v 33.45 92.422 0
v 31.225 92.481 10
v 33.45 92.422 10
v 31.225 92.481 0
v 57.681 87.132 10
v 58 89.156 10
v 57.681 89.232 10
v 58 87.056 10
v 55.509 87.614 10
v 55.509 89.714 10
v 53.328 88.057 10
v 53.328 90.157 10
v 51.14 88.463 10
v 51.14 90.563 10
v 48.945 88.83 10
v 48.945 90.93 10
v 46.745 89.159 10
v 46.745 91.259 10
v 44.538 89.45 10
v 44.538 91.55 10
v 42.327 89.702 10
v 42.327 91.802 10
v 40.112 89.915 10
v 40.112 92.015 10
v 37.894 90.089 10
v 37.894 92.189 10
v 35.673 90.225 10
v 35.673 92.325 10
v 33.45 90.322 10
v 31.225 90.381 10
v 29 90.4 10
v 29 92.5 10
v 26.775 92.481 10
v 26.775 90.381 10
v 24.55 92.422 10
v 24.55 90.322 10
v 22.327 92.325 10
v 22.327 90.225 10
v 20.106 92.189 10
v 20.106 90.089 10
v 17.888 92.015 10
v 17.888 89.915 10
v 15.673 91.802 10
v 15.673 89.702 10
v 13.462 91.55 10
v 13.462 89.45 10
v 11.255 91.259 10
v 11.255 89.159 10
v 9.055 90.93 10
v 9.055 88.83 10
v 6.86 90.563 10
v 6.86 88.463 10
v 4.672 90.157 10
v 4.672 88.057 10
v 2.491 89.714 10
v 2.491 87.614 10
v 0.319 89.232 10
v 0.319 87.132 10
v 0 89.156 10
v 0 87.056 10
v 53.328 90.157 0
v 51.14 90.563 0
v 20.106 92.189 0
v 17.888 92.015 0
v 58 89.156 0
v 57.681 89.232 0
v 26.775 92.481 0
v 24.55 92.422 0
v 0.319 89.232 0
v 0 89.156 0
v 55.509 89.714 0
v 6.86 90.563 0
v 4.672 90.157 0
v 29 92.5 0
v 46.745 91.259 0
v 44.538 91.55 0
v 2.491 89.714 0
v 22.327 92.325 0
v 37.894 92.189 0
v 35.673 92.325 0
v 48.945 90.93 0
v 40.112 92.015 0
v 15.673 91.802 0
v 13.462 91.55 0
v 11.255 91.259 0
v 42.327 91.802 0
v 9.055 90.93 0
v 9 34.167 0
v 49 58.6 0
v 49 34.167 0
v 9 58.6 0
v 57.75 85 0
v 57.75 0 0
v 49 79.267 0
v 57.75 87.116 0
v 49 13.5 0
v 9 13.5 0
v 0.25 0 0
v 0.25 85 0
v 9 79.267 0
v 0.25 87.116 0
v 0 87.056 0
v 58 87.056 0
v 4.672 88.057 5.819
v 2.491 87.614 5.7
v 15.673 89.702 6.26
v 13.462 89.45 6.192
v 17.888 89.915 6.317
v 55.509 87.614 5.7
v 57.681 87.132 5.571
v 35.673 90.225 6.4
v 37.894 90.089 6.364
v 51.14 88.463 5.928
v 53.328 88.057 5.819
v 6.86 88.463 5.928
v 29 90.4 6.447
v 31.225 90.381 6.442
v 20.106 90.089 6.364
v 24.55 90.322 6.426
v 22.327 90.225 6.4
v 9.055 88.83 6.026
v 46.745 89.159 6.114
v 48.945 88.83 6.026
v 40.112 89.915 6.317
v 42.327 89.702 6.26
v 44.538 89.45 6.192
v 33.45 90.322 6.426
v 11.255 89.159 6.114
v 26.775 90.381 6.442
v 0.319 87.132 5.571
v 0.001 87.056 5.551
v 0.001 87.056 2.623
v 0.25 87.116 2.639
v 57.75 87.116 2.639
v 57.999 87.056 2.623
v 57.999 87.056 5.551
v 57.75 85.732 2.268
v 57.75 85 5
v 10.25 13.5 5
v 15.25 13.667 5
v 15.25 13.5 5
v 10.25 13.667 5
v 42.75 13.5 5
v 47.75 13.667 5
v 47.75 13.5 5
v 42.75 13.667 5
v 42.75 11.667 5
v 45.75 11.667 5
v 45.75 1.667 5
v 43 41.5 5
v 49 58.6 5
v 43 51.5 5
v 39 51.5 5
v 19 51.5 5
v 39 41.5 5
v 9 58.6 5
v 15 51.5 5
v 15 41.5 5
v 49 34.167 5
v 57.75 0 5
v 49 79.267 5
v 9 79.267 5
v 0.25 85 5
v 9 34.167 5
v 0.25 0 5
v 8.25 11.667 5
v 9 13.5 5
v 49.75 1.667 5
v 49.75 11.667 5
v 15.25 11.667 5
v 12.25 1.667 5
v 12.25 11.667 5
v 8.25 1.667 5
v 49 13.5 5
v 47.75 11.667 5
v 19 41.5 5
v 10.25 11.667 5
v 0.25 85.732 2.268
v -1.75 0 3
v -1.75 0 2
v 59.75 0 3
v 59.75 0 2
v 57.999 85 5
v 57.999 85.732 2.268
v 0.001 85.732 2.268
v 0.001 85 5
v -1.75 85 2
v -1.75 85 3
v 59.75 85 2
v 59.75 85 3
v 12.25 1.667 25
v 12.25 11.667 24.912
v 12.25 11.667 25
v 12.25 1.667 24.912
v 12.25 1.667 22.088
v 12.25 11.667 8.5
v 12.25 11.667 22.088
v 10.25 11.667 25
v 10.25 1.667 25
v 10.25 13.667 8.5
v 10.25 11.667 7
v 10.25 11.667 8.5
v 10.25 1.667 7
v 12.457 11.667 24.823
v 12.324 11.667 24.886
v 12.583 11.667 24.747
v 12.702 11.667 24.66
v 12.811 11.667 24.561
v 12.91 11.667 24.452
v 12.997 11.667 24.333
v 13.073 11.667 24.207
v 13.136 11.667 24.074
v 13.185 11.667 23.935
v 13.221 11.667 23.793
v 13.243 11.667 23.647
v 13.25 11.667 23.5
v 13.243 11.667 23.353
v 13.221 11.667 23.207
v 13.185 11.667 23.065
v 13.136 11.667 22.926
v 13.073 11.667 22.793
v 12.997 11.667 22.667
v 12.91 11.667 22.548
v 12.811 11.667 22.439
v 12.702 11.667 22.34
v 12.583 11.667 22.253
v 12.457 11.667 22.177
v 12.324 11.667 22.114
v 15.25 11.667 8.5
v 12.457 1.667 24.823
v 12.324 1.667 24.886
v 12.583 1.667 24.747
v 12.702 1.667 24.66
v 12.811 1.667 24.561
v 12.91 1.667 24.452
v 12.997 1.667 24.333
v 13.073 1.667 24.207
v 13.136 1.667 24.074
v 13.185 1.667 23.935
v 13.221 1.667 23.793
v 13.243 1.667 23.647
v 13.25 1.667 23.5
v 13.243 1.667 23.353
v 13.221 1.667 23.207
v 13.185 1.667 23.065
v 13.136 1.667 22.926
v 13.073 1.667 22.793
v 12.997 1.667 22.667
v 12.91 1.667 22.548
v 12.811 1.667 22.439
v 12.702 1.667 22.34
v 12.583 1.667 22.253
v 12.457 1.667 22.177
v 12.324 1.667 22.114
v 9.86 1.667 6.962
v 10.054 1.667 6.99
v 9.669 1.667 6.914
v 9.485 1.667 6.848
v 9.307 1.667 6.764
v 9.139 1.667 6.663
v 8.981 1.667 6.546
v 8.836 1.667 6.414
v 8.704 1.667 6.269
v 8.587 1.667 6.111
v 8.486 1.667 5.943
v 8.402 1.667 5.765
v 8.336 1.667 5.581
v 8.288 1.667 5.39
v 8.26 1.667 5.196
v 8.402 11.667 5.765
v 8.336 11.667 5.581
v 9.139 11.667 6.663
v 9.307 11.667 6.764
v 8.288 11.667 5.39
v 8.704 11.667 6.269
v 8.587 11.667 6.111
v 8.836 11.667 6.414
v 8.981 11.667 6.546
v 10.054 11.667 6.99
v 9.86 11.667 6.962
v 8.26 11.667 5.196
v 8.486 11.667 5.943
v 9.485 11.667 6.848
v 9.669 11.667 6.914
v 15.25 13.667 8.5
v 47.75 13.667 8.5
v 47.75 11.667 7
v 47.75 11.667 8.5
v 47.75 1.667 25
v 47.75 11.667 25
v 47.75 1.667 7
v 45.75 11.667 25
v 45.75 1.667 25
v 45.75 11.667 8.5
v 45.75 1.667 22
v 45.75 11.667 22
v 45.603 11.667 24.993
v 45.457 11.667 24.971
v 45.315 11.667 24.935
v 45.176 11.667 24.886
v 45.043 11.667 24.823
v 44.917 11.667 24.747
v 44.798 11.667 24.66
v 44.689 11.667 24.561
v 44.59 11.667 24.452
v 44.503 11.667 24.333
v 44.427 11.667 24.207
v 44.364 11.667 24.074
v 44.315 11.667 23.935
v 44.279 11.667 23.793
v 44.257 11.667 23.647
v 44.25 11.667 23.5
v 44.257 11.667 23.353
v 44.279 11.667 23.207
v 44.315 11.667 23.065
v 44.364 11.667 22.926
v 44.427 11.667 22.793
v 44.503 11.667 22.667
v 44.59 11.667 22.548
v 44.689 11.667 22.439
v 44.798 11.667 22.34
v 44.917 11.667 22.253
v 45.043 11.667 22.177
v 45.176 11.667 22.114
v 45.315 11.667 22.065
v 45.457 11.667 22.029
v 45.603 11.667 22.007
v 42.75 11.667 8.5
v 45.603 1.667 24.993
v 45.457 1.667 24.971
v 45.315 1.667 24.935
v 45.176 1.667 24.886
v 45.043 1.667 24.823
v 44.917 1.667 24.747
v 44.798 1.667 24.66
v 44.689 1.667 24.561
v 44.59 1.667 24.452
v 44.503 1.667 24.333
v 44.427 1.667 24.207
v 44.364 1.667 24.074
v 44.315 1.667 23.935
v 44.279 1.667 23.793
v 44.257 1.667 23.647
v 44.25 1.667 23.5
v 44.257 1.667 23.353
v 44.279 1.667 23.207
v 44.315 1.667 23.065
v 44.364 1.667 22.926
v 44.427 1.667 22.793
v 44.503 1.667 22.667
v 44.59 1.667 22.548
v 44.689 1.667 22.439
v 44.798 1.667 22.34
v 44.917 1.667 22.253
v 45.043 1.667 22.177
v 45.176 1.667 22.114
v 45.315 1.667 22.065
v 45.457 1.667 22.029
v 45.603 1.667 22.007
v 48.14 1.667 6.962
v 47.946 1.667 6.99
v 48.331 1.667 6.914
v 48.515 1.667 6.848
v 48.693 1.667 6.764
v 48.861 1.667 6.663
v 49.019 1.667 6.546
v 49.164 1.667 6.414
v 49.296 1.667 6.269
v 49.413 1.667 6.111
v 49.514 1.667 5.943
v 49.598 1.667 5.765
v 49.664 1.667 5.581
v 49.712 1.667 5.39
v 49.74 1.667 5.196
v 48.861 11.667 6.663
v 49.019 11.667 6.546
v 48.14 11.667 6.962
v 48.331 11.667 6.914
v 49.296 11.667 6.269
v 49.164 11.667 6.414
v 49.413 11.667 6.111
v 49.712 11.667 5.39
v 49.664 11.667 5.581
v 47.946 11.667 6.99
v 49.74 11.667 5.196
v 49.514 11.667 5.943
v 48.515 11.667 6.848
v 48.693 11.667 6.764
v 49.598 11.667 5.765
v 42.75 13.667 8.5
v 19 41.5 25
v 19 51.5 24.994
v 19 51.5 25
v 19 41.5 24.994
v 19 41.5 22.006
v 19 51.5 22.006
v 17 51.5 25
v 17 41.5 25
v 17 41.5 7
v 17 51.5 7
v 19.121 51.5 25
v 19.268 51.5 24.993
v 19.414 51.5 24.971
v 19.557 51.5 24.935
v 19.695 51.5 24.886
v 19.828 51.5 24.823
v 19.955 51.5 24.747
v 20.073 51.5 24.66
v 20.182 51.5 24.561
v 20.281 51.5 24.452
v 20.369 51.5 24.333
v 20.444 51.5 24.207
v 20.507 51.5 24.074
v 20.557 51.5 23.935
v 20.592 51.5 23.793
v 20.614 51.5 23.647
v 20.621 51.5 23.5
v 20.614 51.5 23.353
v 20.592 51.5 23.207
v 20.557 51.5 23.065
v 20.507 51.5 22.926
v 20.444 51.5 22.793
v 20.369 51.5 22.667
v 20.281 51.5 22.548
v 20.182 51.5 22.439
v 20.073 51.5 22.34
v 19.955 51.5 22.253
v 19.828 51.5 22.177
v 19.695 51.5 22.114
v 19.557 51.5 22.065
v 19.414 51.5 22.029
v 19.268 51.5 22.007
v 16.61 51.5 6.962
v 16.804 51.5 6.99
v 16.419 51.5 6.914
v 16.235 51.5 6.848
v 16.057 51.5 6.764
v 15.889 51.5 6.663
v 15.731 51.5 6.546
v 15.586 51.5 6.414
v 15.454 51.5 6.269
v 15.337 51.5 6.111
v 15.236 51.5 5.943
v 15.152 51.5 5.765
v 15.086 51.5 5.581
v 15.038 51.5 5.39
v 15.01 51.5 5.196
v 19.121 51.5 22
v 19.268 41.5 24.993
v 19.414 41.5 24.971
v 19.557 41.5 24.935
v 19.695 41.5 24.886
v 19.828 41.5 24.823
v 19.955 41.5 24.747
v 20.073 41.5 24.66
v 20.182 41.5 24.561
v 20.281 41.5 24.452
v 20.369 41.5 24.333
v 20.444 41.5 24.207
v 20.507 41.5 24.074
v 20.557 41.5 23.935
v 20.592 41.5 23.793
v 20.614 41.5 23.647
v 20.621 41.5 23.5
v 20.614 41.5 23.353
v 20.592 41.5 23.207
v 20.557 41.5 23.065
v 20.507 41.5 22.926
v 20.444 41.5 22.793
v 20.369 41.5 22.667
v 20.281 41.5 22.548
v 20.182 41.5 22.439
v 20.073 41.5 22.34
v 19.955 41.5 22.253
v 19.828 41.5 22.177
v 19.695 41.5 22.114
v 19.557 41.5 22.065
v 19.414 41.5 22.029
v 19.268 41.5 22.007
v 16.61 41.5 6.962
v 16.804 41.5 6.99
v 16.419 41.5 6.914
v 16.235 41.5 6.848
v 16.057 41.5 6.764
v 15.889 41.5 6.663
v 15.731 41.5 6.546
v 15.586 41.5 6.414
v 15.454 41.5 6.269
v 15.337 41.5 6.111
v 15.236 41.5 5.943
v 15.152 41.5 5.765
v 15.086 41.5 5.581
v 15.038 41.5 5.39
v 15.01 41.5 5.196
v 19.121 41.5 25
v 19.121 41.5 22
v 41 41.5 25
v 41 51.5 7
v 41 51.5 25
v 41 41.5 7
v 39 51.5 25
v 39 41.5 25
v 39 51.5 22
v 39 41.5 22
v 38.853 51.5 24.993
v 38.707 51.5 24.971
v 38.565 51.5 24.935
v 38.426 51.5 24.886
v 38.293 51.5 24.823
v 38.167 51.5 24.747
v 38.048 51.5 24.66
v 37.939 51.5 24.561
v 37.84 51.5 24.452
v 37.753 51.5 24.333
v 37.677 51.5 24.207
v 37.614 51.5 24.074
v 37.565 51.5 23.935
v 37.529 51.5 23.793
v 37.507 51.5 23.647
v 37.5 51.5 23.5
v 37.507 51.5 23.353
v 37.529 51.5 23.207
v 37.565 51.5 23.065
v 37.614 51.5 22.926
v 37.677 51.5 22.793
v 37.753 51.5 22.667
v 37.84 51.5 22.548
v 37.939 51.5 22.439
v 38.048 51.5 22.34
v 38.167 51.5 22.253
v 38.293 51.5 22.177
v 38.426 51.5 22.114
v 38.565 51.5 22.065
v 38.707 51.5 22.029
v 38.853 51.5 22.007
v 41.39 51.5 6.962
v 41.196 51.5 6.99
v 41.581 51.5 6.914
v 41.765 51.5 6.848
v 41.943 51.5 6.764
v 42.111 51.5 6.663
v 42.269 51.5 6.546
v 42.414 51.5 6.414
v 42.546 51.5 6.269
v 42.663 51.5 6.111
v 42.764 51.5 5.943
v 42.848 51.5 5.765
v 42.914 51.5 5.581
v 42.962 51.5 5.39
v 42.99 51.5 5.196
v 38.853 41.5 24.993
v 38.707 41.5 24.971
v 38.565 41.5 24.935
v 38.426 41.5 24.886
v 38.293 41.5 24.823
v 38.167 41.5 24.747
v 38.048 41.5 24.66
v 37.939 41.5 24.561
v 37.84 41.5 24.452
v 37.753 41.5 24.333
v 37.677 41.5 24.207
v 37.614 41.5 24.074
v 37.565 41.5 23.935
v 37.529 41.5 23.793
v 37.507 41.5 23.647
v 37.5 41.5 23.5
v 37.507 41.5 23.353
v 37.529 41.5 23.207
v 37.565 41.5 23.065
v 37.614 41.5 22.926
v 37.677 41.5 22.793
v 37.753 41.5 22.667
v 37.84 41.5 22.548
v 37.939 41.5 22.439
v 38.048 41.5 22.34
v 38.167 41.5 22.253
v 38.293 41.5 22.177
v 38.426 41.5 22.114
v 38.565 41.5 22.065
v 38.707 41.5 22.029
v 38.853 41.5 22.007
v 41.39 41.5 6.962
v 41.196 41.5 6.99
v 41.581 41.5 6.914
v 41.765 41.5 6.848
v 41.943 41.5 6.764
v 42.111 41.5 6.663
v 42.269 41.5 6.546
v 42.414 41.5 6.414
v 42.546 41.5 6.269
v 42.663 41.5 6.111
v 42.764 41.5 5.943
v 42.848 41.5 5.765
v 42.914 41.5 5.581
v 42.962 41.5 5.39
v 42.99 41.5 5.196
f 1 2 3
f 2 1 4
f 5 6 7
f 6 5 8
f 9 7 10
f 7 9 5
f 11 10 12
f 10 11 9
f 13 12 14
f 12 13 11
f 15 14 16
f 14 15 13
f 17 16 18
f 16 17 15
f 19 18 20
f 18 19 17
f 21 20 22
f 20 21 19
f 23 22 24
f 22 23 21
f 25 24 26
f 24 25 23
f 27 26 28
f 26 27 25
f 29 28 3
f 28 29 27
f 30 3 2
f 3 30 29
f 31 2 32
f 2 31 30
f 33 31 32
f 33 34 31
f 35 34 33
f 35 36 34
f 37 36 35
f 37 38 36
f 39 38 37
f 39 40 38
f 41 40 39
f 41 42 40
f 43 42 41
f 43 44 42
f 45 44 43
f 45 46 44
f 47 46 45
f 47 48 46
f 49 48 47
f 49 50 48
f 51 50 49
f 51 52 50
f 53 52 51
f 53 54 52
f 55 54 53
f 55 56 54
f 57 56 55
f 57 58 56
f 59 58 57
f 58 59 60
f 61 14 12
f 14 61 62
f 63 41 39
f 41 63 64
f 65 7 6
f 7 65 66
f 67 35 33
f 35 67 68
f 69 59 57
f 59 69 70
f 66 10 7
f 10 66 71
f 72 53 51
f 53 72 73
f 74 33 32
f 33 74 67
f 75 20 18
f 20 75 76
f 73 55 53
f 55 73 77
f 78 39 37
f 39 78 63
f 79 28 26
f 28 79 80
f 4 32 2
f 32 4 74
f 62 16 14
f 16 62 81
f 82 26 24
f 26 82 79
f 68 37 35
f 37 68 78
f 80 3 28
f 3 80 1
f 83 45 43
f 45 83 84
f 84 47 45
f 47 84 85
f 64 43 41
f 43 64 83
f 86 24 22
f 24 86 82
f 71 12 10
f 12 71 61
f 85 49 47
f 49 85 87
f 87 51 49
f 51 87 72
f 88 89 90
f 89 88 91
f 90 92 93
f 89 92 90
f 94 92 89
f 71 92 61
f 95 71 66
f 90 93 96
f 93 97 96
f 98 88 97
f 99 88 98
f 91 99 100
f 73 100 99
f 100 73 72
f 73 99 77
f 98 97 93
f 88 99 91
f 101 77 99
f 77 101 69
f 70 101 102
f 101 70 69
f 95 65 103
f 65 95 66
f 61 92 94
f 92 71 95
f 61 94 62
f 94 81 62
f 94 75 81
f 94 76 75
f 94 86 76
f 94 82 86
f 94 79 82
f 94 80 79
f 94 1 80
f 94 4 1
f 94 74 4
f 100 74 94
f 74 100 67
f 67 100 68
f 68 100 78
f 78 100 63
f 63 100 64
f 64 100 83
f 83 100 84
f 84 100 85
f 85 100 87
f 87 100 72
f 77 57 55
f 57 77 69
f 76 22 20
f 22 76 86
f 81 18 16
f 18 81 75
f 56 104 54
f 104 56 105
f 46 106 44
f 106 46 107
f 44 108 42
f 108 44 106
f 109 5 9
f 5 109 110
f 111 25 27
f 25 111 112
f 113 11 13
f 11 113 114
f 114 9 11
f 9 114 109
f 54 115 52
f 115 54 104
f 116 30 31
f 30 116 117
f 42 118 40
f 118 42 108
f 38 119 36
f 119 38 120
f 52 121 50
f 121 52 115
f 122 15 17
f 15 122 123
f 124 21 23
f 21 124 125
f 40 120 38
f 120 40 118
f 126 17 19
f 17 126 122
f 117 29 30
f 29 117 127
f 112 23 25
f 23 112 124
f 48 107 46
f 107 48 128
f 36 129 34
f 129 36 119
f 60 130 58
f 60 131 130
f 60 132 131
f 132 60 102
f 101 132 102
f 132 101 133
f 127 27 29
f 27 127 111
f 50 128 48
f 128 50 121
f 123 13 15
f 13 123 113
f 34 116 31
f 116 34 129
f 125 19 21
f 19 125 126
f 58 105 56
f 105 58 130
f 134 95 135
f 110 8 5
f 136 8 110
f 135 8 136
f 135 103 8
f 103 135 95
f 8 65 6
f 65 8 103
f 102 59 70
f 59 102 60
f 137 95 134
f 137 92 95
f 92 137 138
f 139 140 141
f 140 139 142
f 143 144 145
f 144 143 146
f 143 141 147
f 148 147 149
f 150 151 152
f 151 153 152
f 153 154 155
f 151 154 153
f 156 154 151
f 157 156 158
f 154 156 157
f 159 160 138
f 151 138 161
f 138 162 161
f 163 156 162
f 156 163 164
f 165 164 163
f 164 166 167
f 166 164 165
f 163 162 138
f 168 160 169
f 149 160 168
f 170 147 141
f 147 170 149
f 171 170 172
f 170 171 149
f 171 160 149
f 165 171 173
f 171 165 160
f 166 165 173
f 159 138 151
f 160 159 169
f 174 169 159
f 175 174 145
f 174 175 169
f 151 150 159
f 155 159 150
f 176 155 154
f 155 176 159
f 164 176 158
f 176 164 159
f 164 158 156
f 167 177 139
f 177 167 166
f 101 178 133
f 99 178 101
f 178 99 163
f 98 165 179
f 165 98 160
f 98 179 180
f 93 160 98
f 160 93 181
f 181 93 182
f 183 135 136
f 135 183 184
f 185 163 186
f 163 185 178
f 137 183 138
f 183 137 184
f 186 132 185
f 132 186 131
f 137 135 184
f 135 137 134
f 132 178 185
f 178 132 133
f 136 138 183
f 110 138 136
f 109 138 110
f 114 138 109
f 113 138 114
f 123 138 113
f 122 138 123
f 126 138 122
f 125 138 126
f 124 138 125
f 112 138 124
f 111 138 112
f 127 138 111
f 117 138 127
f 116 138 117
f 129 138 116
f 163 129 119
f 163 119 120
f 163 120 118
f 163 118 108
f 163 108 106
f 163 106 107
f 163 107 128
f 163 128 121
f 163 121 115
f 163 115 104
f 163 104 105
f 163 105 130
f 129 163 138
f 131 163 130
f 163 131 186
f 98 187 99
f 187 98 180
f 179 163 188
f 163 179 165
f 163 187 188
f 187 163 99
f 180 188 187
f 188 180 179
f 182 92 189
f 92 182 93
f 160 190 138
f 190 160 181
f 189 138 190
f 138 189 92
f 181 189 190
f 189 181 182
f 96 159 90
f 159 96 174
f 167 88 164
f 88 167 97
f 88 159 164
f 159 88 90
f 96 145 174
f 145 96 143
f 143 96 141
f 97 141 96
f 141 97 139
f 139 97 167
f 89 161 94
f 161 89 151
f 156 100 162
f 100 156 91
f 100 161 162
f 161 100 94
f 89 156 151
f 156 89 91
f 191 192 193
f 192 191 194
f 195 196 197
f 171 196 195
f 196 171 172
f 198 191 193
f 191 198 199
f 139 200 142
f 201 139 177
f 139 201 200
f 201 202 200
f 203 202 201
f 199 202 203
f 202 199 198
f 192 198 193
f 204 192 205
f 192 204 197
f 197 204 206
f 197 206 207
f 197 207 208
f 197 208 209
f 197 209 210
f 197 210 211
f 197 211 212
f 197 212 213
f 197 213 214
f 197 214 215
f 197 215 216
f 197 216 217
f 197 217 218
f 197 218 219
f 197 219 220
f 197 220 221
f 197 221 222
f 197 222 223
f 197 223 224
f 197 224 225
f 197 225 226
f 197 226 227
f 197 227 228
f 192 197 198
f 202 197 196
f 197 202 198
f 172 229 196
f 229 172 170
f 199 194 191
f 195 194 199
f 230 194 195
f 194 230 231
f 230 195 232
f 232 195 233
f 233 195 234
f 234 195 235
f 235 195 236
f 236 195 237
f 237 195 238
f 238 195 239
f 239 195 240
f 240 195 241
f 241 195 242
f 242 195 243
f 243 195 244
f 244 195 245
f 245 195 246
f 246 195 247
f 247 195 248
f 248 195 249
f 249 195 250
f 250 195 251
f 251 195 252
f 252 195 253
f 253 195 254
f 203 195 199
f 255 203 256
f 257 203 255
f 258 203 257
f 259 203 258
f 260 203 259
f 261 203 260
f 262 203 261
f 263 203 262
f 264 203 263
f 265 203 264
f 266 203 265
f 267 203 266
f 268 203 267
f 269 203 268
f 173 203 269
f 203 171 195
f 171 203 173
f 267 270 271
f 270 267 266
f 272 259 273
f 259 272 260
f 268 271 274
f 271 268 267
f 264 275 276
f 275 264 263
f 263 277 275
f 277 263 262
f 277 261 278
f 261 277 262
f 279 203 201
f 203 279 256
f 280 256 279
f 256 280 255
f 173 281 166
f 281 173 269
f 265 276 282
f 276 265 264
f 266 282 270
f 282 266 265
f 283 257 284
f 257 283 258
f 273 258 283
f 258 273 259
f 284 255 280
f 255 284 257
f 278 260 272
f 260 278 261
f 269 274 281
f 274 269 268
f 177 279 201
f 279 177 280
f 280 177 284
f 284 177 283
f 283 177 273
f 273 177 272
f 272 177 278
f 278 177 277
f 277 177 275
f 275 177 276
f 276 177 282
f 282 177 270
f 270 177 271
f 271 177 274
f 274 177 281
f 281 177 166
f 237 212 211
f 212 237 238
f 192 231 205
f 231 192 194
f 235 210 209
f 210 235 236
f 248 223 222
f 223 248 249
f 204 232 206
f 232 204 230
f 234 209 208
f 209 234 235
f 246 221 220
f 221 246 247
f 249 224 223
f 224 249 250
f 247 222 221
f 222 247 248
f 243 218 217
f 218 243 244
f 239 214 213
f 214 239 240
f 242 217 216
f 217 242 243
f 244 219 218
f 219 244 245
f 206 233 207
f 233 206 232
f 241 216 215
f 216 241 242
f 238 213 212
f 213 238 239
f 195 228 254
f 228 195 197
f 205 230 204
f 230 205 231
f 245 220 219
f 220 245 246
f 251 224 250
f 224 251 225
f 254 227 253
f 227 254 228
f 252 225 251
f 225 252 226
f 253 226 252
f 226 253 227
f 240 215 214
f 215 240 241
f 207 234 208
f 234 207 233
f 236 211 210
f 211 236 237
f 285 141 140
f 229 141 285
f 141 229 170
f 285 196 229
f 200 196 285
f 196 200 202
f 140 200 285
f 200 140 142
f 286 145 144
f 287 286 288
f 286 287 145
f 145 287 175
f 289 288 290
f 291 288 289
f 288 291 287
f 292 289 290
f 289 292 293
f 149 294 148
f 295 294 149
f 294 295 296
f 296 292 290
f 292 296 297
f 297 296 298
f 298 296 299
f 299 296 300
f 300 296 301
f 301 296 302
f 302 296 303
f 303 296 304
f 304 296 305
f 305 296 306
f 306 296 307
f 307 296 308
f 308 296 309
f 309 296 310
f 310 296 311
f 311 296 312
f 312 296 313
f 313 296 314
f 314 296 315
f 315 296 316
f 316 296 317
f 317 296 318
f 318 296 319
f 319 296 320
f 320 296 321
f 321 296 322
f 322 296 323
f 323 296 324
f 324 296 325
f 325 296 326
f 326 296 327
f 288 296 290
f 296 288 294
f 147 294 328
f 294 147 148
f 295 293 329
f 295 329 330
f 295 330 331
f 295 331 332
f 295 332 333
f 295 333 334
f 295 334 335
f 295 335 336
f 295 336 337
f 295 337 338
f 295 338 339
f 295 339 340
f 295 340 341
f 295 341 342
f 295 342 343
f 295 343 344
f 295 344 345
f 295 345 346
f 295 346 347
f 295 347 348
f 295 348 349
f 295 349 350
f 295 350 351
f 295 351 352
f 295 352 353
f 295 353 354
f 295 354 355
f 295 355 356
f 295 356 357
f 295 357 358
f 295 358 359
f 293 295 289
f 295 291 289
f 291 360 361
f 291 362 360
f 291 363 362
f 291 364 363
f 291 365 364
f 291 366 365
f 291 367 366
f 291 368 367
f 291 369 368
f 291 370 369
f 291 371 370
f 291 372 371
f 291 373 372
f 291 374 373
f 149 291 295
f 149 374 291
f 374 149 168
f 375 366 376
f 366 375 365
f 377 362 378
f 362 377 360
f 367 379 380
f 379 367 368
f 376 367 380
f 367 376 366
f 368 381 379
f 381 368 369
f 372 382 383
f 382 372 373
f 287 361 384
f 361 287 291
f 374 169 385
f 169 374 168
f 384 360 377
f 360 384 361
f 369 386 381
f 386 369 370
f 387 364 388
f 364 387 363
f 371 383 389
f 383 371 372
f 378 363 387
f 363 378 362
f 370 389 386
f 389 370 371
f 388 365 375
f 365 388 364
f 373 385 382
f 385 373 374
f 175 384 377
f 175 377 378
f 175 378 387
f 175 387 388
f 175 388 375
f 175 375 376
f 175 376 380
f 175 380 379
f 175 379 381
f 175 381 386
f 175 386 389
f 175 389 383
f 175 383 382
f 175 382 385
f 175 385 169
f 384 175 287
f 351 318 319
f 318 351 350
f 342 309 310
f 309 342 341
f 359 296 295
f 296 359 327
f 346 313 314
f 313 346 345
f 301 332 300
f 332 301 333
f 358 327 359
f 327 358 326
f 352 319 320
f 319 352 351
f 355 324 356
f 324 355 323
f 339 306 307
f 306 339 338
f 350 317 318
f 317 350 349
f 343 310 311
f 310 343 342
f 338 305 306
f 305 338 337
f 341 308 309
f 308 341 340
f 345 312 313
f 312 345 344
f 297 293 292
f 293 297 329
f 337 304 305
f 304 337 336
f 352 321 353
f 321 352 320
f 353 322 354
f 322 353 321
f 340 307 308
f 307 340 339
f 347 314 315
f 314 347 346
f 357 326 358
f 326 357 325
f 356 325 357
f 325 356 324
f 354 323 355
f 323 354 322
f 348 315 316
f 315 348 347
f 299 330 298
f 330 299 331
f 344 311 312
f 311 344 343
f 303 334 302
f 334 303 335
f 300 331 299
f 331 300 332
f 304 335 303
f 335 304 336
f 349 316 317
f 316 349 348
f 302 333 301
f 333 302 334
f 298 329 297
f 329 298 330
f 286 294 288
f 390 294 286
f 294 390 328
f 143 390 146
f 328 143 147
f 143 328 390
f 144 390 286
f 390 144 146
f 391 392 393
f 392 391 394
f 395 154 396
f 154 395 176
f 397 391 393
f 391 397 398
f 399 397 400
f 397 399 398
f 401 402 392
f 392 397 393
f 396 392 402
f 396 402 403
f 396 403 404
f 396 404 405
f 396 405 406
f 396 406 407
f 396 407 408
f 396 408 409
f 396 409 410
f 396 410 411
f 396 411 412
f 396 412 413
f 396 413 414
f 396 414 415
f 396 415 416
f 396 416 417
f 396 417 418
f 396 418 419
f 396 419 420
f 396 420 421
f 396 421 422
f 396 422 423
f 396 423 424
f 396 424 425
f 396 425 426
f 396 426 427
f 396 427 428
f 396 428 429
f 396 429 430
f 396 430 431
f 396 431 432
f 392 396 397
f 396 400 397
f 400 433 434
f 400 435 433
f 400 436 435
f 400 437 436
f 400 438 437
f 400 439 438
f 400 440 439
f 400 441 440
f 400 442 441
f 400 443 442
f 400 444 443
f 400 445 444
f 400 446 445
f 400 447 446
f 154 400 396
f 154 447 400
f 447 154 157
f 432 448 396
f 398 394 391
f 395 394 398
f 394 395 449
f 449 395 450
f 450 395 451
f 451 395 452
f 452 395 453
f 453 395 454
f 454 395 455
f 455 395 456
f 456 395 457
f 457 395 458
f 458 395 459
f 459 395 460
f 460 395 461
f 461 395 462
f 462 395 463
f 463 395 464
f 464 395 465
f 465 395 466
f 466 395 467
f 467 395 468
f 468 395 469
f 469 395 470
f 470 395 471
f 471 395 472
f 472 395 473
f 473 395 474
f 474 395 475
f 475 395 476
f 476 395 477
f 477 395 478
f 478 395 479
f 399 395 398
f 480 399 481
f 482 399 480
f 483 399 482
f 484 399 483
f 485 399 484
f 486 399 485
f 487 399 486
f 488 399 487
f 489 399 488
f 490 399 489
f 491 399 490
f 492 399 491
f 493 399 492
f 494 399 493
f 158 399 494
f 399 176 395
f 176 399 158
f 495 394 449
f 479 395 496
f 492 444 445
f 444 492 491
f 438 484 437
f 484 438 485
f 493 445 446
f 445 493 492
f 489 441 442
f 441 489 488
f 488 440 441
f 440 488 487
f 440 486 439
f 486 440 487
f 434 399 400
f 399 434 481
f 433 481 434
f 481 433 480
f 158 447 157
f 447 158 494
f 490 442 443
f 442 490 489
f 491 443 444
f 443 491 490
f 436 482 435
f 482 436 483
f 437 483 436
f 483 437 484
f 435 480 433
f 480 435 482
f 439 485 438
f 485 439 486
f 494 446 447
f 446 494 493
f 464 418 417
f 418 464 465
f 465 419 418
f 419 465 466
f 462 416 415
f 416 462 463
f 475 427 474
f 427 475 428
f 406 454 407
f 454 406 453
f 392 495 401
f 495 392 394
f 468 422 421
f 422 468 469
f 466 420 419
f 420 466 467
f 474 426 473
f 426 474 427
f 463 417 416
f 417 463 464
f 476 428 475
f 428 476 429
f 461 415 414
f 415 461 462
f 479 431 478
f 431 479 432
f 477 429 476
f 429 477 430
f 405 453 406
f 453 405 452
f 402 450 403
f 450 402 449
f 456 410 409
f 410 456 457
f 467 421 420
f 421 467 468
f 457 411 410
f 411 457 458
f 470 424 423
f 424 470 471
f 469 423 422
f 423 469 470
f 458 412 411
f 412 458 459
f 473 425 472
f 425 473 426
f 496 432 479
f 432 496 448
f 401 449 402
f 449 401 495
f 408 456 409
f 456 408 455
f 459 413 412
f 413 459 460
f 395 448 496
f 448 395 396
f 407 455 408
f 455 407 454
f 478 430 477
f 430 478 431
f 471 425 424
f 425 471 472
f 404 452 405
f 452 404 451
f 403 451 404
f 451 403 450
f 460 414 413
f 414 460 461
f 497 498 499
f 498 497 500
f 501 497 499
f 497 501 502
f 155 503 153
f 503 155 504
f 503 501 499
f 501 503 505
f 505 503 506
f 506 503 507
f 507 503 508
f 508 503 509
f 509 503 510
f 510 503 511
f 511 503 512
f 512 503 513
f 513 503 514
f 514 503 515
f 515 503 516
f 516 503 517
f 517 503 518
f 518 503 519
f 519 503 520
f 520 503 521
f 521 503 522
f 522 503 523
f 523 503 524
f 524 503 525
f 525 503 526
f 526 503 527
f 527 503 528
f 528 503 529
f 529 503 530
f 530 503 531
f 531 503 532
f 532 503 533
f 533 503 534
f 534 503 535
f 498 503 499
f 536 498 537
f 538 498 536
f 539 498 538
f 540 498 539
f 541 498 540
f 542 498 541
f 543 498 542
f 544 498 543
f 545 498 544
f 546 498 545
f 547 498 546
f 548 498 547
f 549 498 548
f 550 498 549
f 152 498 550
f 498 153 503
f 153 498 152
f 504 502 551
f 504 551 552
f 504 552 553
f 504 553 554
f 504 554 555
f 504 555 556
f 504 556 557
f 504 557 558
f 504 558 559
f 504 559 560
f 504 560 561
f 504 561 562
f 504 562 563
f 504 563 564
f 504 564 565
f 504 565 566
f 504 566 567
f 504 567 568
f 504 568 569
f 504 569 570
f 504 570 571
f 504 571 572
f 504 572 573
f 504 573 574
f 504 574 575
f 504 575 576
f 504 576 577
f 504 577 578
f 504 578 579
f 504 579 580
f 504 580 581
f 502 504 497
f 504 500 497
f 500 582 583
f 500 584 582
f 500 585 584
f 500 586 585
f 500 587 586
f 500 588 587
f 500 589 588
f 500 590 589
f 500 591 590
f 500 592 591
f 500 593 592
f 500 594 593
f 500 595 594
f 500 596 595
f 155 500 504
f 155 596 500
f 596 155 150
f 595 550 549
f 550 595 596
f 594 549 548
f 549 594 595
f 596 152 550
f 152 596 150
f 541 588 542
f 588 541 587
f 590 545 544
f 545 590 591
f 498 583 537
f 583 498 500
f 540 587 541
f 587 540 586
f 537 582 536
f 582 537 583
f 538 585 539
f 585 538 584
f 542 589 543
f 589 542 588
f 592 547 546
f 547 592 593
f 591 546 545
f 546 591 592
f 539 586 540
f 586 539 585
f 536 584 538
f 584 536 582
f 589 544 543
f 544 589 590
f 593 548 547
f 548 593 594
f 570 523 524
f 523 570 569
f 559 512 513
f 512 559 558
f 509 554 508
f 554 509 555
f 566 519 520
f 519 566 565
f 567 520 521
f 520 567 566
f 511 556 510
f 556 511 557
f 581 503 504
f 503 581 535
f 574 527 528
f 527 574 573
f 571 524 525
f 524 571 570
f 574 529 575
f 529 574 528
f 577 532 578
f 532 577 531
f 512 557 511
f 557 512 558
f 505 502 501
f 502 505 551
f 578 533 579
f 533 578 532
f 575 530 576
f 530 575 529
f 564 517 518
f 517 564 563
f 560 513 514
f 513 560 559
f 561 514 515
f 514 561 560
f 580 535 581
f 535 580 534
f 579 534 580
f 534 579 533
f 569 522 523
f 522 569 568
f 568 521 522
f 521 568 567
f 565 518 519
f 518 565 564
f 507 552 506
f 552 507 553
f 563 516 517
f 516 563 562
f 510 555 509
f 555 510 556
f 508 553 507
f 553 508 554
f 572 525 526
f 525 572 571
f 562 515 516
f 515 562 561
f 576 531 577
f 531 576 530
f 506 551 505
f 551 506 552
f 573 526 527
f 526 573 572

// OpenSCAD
/* [Screw holes for attaching the Raspberry Pi 4] */

$fn=$preview?16:64;

// Make the screw holes this much bigger than the
// actual screw for a more comfortable fit
// (a bigger number here will make the screws fit looser)
screw_hole_fudge = 0.15; // [0:0.05:0.5]

/* [Tray width] */

// Make the tray this much narrower on each side
// for a more comfortable fit in the frame
// (a bigger number here will make the fit looser)
tray_insert_fudge = 0.25; // [0:0.05:0.75]

/* [Hidden] */

tray_width = 58;
tray_length = 85;
tray_depth = 5;
tray_lip_overhang = 10;
inner_wall_thickness = 5;
spacer_depth = 3;
spacer_outer_radius = 3;

screw_radius = 1.25 + screw_hole_fudge;
screw_head_radius = 3;
screw_head_depth = 2;
pcb_depth = 2;
spacer_center_width = 49;
spacer_center_length = 58;
spacer_from_edge = (tray_width - spacer_center_width) / 2;

sd_window_width = 40;
floor_window_width = sd_window_width;
floor_window_border = (tray_width - floor_window_width) / 2;
floor_window_length = tray_length - floor_window_border*2 - inner_wall_thickness;

db9_mod_width_min = 20;
db9_mod_width_max = 33.5;
db9_mod_height = 16.3;
db9_slack = 1;
db9_clips = 2;

block=3;
elevation=0;

clip_width = 2;
clip_height = 20+elevation;
clip_length = 10;
//feet = clip_width*4;
feet=4;

epsilon = 0.001;

difference() {
    union() {
        // the main tray
        intersection() {
            union() {
                translate([tray_insert_fudge, 0, 0]) {
                    cube([  tray_width - 2*tray_insert_fudge,
                            tray_length + tray_lip_overhang,
                            tray_depth]);
                }
                
                difference() {
                    // the outer part of the curved handle
                    translate([ tray_width/2,
                                -tray_length*0.5 + 7.5,
                                0]) {
                        cylinder(
                            h=tray_depth + spacer_depth + pcb_depth,
                            r=tray_length*1.5,
                            center=false,
                            $fn=360);
                    }
                    
                    // cut away the inside to make it a shell
                    translate([ tray_width/2,
                                -tray_length*0.5 + 5.4,
                                -epsilon]) {
                        cylinder(
                            h=tray_depth + spacer_depth + pcb_depth + 2*epsilon,
                            r=tray_length*1.5,
                            center=false,
                            $fn=360);
                    }
                    translate([ tray_width,
                                -tray_length,
                                -epsilon]) {
                        cube([  2*tray_width,
                                3*tray_length,
                                tray_depth + spacer_depth + pcb_depth + 2*epsilon]);
                    }
                    translate([ -2*tray_width,
                                -tray_length,
                                -epsilon]) {
                        cube([  2*tray_width,
                                3*tray_length,
                                tray_depth + spacer_depth + pcb_depth + 2*epsilon]);
                    }
                }
                
                // reinforce the curved handle
                translate([epsilon, tray_length, tray_depth]) {
                    rotate([-75, 0, 0]) {
                        cube([tray_width - 2*epsilon, 2*sqrt(2), 6]);
                    }
                }
                
            }
            
            // cut away the ears of the tray
            // where they jut through the curved handle
            translate([ tray_width/2,
                        -tray_length*0.5 + 7.5,
                        0]) {
                cylinder(
                    h=tray_depth + spacer_depth + pcb_depth,
                    r=tray_length*1.5,
                    center=false,
                    $fn=360);
            }
        }
        // the tray insert edge tabs
        
        for (a=[    tray_insert_fudge,
                    tray_width - tray_insert_fudge]) {
            translate([ a,
                        0,
                        tray_depth/2]) {
                intersection() {
                    rotate([0, 45, 0]) {
                        translate([-tray_depth/sqrt(2)/2, 0, -tray_depth/sqrt(2)/2]) {
                            cube([  tray_depth/sqrt(2),
                                    tray_length,
                                    tray_depth/sqrt(2)]);
                        }
                    }
                    translate([-tray_depth/2+0.5, 0, -tray_depth/2]) {
                        cube([  tray_depth-1,
                                tray_length,
                                tray_depth]);
                    }
                }
            }
        }
    }
    

    // punch a hole in the bottom
    translate([ floor_window_border,
                floor_window_border*1.5,
                -epsilon]) {
        cube([  floor_window_width,
                floor_window_length/3,
                tray_depth + 2*epsilon]);
    }
    translate([ floor_window_border,
                floor_window_border+floor_window_length/3*2.4,
                -epsilon]) {
        cube([  floor_window_width,
                floor_window_length/3,
                tray_depth + 2*epsilon]);
    }
}

db9sperre=[5,clip_width,3.5];
// DB9 module fasteinging
translate([tray_width/2-db9_mod_width_max/2-db9_slack-clip_width/2,tray_depth/3,tray_depth]) {
    cube([clip_width,clip_length,clip_height]);
    cube([db9_mod_width_max+clip_width,tray_width/2-db9_mod_width_max/2-db9_slack-clip_width/2,elevation]);
    // feet
    rotate([270,0,0]) {
        cylinder(h=clip_length, d=feet);
    }
    translate([block/2, 0, clip_height-block/2]) {
        rotate([270,0,0]) {
            cylinder(h=clip_length, d=block);
        }
    }
    translate([0,clip_length,0]) {
        cube(db9sperre);
    }
}
translate([tray_width/2+db9_mod_width_max/2+db9_slack-clip_width/2,tray_depth/3,tray_depth]) {
    cube([clip_width,clip_length,clip_height]);
    translate([clip_width,0,0]) {
        rotate([270,0,0]) {
            cylinder(h=clip_length, d=feet);
        }
    }
    translate([0, 0, clip_height-block/2]) {
        rotate([270,0,0]) {
            cylinder(h=clip_length, d=block);
        }
    }
    translate([-db9sperre[0]+clip_width,clip_length,0]) {
        cube(db9sperre);
    }
}

// Og den andre
translate([tray_width/2-db9_mod_width_min/2-db9_slack-clip_width/2,tray_depth*8.3,tray_depth]) {
    cube([clip_width,clip_length,clip_height]);
    cube([db9_mod_width_min+clip_width,tray_width/2-db9_mod_width_max/2-db9_slack-clip_width/2,elevation]);
    rotate([270,0,0]) {
        cylinder(h=clip_length, d=feet);
    }
    translate([block/sqrt(2), 0, clip_height-block/2]) {
        rotate([270,0,0]) {
            cylinder(h=clip_length, d=block);
        }
    }
}
translate([tray_width/2+db9_mod_width_min/2+db9_slack-clip_width/2,tray_depth*8.3,tray_depth]) {
    cube([clip_width,clip_length,clip_height]);
    translate([clip_width,0,0]) {
        rotate([270,0,0]) {
            cylinder(h=clip_length, d=feet);
        }
    }
    translate([0, 0, clip_height-block/2]) {
        rotate([270,0,0]) {
            cylinder(h=clip_length, d=block);
        }
    }
}
